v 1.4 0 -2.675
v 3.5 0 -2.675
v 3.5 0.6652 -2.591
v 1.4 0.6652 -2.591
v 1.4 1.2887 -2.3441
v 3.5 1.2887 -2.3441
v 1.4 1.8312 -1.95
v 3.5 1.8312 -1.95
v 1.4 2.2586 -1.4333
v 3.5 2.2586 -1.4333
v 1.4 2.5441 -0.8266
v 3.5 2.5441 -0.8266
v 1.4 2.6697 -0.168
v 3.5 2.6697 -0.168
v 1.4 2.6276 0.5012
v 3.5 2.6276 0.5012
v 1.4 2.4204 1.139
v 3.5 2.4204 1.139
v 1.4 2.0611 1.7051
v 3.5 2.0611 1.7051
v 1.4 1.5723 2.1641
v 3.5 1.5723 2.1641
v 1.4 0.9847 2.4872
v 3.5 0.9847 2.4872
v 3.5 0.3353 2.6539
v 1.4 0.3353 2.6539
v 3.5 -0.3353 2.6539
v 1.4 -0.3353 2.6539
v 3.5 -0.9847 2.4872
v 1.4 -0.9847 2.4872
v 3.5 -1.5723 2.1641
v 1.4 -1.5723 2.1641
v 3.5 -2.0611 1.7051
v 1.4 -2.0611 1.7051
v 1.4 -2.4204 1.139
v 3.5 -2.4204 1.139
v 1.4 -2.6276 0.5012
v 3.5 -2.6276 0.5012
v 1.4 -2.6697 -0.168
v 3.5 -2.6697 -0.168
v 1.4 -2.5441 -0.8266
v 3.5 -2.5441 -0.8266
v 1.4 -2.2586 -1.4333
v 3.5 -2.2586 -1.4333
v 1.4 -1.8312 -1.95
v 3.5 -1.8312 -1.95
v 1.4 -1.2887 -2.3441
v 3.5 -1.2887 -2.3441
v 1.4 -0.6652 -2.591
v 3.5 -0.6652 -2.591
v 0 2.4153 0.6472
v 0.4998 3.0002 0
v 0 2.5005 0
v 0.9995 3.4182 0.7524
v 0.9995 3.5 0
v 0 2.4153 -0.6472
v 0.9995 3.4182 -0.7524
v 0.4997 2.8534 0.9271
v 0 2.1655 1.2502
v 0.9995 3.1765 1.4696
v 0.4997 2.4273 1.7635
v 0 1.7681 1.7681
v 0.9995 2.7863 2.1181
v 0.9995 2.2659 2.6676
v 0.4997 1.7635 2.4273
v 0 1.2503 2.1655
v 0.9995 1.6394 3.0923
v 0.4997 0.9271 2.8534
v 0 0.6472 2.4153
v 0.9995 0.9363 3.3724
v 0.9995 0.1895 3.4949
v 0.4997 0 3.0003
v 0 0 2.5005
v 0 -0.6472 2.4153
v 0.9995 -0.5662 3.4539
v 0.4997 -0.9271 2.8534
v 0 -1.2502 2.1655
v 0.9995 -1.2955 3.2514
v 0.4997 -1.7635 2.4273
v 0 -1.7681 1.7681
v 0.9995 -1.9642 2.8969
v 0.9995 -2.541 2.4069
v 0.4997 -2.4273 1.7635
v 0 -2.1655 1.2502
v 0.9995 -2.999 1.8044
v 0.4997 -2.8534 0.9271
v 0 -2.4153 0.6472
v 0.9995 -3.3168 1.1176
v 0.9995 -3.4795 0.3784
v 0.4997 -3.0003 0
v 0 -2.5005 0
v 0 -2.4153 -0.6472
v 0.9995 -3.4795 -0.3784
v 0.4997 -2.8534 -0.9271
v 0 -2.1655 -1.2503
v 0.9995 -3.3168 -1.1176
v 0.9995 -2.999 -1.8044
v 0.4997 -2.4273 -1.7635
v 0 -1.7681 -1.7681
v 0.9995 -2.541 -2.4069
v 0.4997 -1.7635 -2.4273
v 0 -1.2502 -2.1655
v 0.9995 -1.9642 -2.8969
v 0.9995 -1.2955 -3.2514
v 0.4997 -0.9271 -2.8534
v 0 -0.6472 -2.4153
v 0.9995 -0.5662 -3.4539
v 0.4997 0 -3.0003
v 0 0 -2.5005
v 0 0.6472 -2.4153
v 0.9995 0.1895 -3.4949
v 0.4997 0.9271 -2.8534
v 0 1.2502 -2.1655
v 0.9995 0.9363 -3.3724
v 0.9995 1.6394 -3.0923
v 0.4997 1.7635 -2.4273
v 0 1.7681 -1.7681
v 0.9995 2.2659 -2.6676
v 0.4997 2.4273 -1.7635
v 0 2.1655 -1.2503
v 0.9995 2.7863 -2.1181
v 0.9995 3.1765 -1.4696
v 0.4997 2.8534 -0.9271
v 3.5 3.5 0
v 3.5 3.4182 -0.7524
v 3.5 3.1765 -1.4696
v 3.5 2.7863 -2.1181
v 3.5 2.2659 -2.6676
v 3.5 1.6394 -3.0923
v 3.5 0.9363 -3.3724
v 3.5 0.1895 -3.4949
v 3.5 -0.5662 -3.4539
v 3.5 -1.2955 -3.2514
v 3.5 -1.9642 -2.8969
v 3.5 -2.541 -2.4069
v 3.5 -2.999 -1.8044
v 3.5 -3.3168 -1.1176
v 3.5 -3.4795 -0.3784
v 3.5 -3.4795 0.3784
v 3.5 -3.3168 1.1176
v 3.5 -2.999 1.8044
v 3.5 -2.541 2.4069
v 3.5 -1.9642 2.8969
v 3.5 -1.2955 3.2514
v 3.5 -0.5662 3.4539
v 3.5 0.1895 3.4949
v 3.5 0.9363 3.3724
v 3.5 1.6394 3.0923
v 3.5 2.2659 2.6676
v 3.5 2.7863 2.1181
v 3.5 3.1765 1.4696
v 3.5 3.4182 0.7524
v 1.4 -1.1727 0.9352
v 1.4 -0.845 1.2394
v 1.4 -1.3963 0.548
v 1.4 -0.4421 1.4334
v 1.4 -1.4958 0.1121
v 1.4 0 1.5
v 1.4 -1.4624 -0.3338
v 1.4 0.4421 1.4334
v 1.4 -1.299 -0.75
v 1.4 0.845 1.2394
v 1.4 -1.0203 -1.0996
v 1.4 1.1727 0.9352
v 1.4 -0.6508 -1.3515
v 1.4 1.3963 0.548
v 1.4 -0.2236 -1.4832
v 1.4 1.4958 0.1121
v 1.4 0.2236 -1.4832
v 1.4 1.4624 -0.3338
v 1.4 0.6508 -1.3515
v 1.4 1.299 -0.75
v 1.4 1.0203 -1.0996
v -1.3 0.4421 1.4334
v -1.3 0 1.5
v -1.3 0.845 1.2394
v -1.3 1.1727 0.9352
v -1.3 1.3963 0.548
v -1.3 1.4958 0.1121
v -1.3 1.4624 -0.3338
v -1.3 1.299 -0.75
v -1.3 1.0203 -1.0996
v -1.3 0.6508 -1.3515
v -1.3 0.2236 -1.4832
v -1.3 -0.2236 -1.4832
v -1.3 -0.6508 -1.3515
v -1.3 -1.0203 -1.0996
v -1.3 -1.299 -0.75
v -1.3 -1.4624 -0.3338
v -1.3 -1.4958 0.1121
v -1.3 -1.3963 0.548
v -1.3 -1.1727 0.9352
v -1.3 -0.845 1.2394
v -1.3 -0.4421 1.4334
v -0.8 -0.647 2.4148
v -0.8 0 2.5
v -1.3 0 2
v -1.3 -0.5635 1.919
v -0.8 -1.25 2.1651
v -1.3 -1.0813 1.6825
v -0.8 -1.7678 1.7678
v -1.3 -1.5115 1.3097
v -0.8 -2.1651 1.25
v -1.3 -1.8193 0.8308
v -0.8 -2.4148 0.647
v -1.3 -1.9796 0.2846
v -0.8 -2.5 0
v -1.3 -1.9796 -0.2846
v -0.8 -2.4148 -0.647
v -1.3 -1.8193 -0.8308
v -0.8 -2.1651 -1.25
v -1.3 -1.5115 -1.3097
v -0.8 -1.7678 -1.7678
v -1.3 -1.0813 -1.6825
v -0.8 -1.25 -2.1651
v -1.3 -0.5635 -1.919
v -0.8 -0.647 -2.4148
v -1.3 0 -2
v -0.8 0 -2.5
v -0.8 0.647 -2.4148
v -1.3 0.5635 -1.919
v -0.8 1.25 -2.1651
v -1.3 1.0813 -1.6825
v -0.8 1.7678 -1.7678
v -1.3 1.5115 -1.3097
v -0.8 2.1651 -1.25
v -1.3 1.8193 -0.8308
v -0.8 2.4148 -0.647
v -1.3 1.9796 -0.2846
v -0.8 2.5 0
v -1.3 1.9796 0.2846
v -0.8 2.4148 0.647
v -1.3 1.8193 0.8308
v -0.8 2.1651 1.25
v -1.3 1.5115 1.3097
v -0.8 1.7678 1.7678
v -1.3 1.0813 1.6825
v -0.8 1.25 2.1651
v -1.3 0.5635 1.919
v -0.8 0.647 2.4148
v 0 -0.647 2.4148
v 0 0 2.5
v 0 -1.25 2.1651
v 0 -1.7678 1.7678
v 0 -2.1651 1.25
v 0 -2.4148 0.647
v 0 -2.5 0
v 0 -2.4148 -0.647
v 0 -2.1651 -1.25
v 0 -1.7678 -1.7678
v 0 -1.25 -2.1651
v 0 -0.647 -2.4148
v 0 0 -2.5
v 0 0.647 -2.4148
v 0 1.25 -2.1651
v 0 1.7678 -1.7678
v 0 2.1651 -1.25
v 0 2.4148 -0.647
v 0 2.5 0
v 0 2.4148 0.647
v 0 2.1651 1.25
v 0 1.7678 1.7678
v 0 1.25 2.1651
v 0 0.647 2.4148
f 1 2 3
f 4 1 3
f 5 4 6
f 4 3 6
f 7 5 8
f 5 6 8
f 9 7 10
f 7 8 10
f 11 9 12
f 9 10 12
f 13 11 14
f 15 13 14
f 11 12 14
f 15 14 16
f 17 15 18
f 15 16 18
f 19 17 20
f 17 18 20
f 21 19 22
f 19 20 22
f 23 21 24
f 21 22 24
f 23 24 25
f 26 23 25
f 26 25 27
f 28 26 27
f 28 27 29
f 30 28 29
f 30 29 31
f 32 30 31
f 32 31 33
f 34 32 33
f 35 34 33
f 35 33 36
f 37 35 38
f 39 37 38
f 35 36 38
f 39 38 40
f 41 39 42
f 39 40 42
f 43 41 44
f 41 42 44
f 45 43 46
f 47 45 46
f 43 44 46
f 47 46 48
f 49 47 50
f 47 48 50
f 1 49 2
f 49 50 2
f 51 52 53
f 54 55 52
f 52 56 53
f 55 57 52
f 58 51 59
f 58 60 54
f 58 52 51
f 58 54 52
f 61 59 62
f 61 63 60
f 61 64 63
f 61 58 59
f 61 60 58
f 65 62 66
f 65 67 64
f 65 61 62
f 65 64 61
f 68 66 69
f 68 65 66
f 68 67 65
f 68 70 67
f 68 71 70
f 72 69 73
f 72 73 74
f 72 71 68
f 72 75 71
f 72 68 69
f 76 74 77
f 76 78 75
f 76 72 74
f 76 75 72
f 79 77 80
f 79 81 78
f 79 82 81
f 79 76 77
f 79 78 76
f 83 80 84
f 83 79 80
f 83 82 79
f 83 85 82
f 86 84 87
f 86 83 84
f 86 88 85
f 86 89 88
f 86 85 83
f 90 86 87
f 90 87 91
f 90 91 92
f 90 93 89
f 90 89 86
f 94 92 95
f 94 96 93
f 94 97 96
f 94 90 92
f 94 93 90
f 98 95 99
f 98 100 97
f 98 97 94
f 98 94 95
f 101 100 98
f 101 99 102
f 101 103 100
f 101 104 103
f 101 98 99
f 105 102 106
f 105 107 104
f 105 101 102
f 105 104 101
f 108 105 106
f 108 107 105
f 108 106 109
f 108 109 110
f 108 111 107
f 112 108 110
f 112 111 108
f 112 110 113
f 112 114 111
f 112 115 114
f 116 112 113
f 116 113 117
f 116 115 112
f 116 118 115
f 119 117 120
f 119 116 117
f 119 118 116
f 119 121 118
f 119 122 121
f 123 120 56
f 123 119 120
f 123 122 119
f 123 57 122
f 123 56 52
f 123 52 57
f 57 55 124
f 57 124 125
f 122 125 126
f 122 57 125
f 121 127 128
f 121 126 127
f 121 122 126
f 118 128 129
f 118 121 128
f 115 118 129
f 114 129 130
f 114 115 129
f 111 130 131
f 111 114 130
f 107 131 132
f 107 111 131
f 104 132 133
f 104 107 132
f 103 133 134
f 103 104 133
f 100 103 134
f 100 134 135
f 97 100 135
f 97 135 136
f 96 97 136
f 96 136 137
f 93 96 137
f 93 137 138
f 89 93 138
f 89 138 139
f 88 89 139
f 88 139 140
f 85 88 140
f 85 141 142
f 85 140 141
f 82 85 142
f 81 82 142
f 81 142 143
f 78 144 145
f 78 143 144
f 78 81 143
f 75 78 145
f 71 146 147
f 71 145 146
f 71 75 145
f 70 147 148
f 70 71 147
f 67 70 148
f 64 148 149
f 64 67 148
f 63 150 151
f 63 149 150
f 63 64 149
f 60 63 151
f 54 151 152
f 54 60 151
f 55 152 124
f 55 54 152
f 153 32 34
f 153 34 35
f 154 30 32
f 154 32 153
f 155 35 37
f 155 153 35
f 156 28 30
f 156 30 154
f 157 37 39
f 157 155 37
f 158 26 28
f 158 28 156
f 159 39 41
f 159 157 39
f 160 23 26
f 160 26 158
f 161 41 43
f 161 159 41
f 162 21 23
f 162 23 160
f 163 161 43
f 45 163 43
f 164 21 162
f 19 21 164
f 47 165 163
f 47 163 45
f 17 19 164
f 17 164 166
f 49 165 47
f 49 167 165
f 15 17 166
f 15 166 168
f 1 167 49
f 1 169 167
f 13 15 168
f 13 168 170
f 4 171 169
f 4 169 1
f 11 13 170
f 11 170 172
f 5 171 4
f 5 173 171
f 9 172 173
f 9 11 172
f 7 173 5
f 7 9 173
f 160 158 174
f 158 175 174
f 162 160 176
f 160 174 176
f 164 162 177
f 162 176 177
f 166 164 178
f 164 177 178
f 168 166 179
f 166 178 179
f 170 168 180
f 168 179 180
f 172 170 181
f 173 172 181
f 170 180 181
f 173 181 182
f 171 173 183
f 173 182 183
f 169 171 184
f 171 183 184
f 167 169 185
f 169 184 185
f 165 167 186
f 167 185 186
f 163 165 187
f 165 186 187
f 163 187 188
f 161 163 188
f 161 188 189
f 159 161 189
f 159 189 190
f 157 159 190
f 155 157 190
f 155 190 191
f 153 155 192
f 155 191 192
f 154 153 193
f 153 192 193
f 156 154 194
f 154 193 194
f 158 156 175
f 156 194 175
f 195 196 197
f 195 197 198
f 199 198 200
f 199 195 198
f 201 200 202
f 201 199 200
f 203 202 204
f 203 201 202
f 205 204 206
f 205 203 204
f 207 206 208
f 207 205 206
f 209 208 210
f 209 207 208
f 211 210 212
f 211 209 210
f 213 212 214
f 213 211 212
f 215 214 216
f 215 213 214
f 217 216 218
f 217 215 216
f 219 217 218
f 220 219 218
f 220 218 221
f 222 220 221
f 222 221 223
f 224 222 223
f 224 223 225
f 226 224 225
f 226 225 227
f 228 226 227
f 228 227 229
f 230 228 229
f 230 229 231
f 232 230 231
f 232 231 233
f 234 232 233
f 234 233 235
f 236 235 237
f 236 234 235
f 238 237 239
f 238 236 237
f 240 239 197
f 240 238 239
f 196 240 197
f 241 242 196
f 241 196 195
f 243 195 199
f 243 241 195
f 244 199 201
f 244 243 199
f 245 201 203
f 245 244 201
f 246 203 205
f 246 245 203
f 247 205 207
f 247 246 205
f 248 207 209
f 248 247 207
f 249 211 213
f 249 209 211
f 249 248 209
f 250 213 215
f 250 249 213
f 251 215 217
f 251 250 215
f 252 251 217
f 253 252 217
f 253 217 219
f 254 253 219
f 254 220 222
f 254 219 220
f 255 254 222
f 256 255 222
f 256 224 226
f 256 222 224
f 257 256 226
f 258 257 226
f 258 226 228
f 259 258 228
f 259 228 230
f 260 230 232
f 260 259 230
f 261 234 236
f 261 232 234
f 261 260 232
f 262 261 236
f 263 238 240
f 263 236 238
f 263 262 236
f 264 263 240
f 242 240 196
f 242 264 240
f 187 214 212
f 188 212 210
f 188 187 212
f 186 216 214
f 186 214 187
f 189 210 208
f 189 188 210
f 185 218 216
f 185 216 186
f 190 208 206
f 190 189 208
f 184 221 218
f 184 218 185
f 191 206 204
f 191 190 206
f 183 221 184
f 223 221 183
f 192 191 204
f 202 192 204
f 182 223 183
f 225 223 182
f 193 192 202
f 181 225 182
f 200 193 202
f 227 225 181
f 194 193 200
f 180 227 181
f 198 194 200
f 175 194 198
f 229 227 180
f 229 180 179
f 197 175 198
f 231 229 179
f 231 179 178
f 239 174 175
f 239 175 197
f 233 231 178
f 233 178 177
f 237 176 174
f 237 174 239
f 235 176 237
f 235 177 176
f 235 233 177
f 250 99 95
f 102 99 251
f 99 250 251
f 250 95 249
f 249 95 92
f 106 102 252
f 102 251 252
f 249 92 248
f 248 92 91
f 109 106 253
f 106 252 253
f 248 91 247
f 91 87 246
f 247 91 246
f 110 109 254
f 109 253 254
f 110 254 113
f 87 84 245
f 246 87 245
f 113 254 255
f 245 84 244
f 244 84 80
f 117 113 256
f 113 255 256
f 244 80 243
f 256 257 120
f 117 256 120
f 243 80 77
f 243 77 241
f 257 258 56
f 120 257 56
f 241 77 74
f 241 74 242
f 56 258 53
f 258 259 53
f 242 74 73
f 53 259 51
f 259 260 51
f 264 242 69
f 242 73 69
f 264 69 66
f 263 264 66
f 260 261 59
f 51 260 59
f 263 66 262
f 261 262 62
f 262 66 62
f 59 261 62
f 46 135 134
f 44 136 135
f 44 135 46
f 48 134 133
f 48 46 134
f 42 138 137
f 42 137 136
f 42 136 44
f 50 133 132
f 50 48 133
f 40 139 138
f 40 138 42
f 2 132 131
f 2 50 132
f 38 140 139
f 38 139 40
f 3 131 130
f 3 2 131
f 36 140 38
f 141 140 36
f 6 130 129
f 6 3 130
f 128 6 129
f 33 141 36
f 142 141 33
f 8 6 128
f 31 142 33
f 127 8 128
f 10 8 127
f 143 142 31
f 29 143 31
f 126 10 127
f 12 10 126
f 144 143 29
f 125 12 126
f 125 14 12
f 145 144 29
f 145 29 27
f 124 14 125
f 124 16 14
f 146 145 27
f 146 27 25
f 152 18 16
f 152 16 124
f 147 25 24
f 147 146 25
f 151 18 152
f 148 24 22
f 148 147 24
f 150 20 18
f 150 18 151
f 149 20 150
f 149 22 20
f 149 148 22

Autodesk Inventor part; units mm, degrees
ref_plane "YZ Plane" through (0, 0, 0) normal (1, 0, 0) x (0, 1, 0)
ref_plane "XZ Plane" through (0, 0, 0) normal (0, 1, 0) x (-1, 0, 0)
ref_plane "XY Plane" through (0, 0, 0) normal (0, 0, 1) x (1, 0, 0)
sketch "スケッチ1" plane through (0, 0, 0) normal (1, 0, 0) x (0, 1, 0)
  circle A0 centre (0, 0) radius 3.5
  dimension "d0" = 7
extrude "押し出し1" add sketch "スケッチ1" along normal blind 3.5
sketch "スケッチ2" plane through (3.5, 0, 0) normal (1, 0, 0) x (0, 0, -1)
  circle A0 centre (0, 0) radius 2.675
  dimension "d3" = 5.35
extrude "押し出し2" cut sketch "スケッチ2" against normal blind 2.1
sketch "スケッチ3" plane through (0, 0, 0) normal (-1, 0, 0) x (0, 0, 1)
  circle A0 centre (0, 0) radius 2.5
  dimension "d6" = 5
extrude "押し出し3" add sketch "スケッチ3" along normal blind 1.3
sketch "スケッチ4" plane through (-1.3, 0, 0) normal (-1, 0, 0) x (0, 0, 1)
  circle A0 centre (0, 0) radius 1.5
  dimension "d9" = 3
extrude "押し出し4" cut sketch "スケッチ4" against normal through all
chamfer "面取り4" distance 1 angle 45 1 edges at (0, -3.5, 0)
chamfer "面取り5" distance 0.5 angle 45 1 edges at (-1.3, 0, -2.5)
properties part number "MagnetMounter"
